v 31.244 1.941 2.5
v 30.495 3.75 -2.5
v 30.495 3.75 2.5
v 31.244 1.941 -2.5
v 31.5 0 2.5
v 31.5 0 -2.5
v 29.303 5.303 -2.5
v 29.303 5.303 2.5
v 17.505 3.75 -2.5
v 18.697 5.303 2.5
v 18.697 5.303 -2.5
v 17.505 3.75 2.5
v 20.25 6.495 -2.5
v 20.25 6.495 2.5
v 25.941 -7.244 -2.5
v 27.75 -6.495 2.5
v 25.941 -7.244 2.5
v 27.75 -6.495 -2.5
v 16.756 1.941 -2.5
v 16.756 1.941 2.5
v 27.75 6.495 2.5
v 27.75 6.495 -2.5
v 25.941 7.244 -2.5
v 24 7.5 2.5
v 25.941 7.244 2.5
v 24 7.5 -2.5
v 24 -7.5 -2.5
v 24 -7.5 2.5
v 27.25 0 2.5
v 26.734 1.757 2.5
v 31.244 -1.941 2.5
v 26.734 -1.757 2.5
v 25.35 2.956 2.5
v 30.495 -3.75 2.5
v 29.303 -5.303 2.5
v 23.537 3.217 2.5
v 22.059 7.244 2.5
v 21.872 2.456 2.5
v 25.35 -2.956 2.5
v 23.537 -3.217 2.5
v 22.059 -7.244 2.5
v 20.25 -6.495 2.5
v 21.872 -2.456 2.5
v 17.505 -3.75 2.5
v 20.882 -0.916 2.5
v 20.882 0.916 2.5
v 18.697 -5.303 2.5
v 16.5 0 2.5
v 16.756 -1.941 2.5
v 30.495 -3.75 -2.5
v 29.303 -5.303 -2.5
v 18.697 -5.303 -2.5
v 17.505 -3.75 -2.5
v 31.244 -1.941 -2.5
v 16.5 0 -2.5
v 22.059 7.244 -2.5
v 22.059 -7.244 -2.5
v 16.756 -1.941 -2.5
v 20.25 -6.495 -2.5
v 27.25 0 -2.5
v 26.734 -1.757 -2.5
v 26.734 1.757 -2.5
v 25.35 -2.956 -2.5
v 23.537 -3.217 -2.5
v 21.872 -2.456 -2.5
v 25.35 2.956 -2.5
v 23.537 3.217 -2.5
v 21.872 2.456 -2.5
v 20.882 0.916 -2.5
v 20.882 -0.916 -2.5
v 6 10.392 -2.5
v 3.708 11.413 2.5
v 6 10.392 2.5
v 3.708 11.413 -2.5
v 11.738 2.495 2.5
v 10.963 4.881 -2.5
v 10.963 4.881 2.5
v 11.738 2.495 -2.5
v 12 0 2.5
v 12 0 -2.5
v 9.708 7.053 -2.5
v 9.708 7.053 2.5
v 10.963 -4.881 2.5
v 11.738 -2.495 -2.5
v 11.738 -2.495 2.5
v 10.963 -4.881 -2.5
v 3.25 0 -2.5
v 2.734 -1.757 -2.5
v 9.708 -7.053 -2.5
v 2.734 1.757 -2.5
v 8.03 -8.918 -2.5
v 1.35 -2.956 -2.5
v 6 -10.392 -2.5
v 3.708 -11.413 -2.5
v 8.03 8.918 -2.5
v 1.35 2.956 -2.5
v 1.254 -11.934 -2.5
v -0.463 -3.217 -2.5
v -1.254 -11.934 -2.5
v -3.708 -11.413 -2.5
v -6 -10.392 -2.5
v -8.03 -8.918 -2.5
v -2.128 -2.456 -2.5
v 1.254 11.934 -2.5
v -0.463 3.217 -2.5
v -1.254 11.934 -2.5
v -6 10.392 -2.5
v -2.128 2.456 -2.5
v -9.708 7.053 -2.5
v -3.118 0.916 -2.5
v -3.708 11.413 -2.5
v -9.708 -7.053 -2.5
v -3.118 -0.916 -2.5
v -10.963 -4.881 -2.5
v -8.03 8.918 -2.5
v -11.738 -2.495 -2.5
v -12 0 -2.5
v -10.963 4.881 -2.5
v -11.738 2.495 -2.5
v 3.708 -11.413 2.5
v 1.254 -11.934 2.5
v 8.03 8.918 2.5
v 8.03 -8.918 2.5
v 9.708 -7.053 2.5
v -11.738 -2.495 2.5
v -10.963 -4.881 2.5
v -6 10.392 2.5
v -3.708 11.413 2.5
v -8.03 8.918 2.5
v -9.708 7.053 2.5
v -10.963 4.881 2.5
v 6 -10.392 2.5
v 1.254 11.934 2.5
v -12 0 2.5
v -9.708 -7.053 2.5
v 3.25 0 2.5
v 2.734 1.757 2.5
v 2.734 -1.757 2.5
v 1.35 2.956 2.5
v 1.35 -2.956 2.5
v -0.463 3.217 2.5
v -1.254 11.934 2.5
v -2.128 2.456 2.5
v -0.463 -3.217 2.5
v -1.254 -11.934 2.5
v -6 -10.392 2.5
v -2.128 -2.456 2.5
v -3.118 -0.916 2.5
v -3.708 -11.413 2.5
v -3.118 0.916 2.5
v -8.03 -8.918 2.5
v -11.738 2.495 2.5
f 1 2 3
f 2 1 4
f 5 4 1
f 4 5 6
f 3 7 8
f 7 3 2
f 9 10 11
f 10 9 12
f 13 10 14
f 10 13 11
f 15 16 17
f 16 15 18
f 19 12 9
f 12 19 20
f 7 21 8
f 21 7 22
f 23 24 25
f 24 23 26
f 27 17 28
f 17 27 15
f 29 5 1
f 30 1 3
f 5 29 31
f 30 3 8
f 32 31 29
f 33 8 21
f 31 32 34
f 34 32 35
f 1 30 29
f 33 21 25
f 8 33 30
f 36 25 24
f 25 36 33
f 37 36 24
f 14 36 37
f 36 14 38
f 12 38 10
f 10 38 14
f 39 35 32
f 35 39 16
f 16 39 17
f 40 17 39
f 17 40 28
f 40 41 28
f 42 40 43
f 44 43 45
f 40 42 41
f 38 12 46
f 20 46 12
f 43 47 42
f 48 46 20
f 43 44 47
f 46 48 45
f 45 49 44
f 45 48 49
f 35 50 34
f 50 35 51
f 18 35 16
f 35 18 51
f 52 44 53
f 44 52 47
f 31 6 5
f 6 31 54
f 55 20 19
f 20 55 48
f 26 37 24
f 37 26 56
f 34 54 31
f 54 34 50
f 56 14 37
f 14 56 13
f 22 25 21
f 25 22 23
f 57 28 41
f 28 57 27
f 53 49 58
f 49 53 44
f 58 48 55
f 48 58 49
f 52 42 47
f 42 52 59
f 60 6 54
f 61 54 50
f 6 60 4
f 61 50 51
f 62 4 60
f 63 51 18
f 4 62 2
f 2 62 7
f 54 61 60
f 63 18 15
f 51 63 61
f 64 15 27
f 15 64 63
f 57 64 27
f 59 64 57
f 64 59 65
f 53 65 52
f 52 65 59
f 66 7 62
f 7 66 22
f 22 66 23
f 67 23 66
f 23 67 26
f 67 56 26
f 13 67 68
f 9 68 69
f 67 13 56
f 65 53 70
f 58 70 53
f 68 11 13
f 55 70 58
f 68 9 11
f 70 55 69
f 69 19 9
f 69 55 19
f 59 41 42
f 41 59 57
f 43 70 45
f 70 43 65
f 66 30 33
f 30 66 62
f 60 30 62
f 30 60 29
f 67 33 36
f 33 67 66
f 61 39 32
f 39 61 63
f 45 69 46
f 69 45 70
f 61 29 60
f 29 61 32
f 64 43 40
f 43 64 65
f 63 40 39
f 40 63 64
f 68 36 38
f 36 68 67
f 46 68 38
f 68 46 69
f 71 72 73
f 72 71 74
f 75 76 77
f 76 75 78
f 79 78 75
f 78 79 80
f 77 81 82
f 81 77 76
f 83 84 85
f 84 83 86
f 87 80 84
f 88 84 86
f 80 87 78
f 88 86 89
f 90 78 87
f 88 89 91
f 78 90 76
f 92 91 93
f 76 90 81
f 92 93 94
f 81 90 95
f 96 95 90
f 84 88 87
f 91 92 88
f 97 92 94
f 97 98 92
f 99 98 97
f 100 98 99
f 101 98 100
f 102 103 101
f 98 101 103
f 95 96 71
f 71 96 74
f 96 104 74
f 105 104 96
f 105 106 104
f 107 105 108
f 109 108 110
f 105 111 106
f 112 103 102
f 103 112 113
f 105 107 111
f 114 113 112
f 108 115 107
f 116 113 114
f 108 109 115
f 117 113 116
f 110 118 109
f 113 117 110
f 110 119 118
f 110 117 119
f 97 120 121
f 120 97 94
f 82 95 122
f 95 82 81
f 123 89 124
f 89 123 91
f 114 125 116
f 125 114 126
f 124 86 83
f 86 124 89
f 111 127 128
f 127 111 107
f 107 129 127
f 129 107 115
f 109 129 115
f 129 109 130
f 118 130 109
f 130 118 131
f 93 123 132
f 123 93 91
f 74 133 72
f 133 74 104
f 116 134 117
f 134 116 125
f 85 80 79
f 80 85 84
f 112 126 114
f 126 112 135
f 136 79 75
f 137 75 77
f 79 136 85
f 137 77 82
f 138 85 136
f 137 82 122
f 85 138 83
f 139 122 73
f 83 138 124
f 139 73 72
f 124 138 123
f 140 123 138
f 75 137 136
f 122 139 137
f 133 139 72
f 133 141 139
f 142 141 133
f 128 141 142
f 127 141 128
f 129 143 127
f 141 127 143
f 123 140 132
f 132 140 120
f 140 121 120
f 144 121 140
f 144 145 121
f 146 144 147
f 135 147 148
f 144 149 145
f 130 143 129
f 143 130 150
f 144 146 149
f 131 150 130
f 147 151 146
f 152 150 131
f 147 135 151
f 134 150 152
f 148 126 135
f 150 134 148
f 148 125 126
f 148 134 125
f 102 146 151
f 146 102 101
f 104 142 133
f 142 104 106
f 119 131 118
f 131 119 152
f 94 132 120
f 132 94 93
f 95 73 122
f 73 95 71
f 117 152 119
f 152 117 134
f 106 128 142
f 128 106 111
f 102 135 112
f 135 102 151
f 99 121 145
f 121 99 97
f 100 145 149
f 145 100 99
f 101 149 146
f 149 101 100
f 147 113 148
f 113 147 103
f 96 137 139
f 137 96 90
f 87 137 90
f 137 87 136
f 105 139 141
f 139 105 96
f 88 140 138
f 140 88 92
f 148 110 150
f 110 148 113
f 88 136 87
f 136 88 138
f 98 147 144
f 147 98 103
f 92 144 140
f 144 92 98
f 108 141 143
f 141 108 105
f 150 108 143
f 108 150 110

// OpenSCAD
d_small_nut = 15;
d_big_nut = 24;
h_nut = 5;

translate([d_big_nut, 0, 0])
nut_small();
nut_big();

module nut_small() {
    difference() {
        cylinder(d=d_small_nut, h=h_nut, center=true);
        cylinder(h=40, d=6.5, center=true);
    }
}

module nut_big() {
    difference() {
        cylinder(d=d_big_nut, h=h_nut, center=true);
        cylinder(h=40, d=6.5, center=true);
    }
}
